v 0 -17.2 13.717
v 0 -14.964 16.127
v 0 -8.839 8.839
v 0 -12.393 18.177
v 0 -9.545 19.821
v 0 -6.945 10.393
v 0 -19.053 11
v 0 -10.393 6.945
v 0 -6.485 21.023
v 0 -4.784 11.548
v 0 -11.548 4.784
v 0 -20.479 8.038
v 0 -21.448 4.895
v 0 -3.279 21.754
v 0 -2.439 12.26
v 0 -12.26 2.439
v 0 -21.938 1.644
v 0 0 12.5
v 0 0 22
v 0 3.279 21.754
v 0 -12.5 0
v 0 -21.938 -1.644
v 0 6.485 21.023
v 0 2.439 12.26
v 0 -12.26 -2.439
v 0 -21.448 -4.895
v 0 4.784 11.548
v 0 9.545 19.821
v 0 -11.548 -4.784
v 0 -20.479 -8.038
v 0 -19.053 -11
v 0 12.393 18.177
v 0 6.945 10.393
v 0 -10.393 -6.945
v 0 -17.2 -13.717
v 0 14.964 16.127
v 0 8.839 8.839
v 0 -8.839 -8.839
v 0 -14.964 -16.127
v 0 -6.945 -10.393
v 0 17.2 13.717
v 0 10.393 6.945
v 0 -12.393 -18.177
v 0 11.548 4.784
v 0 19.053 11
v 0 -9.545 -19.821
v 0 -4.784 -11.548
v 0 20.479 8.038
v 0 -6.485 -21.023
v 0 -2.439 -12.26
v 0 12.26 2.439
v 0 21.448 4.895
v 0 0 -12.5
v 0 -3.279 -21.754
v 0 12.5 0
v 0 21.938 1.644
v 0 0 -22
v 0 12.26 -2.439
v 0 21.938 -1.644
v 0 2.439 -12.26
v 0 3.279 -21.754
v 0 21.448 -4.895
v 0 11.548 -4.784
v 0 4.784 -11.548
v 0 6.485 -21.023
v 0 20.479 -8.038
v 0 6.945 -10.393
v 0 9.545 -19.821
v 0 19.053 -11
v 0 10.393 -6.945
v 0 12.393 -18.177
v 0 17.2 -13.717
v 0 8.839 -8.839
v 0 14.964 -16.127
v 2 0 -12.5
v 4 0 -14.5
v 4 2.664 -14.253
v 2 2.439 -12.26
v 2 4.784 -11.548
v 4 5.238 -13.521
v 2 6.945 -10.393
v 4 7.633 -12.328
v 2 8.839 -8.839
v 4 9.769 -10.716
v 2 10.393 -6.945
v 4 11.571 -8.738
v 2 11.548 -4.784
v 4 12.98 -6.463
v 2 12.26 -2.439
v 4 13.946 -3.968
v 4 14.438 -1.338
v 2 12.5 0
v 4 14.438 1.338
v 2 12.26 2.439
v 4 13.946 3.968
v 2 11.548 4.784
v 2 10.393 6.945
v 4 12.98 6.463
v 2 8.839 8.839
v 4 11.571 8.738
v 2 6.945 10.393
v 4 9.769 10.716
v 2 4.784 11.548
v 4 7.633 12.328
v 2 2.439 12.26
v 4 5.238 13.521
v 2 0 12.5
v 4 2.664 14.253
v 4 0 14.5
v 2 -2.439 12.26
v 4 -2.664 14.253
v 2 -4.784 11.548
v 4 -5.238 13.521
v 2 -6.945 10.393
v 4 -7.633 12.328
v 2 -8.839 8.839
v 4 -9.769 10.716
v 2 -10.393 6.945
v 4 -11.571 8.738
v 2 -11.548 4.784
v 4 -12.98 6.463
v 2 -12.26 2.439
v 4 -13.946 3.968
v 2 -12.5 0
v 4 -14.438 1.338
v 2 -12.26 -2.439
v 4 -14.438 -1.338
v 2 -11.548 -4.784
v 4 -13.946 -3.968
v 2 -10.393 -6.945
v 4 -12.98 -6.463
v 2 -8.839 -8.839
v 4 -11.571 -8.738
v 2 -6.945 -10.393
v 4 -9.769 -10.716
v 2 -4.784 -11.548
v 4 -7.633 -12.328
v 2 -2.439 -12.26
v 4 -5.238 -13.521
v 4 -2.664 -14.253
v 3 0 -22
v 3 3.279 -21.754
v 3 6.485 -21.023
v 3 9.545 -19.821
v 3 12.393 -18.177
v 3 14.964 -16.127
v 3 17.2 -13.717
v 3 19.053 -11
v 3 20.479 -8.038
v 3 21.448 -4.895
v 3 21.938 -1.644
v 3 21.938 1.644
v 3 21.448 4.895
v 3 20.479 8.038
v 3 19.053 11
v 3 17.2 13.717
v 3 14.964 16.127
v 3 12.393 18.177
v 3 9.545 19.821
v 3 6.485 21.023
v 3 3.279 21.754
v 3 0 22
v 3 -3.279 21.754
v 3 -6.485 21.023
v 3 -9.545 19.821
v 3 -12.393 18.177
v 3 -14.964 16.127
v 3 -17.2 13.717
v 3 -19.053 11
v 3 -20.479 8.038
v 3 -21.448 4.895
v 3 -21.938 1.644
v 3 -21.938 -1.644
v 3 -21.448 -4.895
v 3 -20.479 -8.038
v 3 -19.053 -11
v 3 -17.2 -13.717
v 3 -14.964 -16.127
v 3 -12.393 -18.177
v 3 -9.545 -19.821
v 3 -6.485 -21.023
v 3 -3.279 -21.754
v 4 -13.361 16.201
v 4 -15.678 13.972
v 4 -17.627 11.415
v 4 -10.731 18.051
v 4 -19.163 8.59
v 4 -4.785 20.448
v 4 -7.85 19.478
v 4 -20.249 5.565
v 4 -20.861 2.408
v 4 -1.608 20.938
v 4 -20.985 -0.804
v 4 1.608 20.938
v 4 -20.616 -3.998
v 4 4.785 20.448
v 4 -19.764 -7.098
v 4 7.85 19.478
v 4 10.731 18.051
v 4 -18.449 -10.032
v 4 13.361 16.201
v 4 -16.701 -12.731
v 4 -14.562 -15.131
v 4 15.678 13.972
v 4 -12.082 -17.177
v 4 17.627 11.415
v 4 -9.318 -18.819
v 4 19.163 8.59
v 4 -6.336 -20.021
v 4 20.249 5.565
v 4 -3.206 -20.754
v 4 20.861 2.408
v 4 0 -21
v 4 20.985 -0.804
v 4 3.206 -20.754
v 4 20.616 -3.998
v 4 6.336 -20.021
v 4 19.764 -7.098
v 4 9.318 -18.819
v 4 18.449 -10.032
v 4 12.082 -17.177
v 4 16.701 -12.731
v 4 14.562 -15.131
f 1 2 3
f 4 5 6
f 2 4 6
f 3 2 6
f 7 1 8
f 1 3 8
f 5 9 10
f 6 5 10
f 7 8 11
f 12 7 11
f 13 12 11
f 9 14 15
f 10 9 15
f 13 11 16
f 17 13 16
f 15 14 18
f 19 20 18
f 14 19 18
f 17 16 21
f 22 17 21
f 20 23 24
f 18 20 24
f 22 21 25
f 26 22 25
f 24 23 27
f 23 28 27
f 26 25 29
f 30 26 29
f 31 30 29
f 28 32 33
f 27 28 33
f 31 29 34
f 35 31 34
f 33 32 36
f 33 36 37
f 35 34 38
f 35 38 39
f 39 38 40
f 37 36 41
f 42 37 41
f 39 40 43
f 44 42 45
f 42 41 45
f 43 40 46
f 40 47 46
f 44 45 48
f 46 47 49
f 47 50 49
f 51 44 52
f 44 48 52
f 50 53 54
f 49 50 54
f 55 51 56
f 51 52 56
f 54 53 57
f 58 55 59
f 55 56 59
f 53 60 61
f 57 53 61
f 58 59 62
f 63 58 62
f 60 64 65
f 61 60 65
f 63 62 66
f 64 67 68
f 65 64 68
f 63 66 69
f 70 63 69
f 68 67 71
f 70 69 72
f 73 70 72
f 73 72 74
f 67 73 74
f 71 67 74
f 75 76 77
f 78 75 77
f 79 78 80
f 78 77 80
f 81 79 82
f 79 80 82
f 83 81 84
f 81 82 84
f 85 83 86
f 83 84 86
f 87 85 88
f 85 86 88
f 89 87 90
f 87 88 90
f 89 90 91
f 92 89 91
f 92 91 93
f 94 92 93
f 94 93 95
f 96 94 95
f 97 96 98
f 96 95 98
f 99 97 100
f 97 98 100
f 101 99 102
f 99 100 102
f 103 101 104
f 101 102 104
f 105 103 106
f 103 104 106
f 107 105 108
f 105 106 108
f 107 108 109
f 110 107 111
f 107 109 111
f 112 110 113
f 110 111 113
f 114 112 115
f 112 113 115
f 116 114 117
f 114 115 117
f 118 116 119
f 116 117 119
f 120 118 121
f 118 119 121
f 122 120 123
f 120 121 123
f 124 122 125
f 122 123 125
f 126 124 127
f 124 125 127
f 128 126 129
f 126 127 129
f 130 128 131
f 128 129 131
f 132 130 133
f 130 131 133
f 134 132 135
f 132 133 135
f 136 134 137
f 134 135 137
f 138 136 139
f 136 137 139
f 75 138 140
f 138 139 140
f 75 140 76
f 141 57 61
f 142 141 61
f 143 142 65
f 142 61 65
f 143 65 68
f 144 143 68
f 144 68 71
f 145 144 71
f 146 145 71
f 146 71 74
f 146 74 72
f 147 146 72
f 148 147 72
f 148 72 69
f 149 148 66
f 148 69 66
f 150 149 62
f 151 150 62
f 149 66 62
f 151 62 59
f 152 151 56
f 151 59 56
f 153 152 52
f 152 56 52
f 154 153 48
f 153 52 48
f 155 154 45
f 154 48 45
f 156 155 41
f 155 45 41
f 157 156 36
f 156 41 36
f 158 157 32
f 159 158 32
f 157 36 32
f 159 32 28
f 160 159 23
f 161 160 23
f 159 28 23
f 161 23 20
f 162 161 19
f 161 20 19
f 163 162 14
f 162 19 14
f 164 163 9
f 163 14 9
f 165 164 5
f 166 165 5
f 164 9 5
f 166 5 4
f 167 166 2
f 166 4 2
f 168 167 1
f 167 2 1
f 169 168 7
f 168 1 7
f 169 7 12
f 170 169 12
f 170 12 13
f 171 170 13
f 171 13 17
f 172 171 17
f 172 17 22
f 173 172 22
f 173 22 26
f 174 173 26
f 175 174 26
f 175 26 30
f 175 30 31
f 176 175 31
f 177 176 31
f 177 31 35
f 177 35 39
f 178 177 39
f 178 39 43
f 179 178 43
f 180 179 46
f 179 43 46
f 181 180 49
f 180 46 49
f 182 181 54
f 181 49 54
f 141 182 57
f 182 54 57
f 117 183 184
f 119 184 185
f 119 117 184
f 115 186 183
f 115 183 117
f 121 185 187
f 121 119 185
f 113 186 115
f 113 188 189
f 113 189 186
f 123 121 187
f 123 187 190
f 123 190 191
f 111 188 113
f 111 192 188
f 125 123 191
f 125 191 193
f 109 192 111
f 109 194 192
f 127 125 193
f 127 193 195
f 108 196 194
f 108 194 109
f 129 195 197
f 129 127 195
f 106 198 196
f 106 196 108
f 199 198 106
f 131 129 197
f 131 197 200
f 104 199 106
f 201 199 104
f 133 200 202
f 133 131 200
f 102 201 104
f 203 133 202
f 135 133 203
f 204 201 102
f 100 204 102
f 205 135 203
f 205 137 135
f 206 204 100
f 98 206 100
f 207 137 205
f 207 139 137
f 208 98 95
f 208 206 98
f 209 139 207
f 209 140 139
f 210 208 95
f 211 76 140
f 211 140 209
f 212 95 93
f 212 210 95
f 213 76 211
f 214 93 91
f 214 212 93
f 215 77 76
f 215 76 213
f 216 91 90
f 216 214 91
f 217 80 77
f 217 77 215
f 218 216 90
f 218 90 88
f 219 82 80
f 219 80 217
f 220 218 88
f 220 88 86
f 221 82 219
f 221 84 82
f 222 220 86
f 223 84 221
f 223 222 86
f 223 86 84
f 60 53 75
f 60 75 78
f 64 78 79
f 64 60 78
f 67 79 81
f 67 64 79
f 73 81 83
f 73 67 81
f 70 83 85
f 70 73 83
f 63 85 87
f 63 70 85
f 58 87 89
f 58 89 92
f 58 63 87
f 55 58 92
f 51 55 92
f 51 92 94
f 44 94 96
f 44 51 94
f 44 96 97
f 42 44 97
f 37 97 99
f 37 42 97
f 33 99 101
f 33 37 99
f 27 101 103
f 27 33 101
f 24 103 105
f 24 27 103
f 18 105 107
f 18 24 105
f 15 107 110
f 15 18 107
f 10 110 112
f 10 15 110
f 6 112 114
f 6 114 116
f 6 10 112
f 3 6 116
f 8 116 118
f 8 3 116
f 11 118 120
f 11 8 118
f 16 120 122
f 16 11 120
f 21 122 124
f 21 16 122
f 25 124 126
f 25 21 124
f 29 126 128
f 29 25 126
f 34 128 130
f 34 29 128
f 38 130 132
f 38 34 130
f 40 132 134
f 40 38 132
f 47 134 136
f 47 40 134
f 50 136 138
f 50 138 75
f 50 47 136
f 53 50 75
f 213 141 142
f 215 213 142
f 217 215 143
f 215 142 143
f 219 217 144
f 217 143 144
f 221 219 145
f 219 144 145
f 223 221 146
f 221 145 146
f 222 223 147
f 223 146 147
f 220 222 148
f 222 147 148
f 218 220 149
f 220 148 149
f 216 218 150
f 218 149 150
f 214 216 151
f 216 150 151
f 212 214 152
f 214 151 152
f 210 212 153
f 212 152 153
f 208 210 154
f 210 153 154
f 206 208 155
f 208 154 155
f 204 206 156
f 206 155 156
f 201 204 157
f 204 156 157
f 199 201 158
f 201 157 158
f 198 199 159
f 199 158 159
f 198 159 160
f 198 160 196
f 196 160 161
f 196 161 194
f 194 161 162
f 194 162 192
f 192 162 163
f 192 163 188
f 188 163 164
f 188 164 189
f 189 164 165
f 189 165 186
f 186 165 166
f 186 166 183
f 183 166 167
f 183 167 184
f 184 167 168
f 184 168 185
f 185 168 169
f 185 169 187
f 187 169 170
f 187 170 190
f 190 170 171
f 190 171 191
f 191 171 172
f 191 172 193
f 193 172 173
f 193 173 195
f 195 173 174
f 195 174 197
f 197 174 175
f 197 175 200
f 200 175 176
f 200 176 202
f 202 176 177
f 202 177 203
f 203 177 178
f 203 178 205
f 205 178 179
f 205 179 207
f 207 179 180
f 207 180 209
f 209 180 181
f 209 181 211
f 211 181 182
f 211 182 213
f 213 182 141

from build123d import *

# Parameters (mm, degrees)
SKETCH1_R          = 22
SKETCH1_R_2        = 12.5
BASE_EXTRUDE_DEPTH = 4
IDCHAMFER_SIZE     = 2
ODCHAMFER_SIZE     = 1


with BuildPart() as part:
    # Sketch1 → Base-Extrude (new body)
    with BuildSketch(Plane(origin=(0, 0, 0), x_dir=(0, 0, -1), z_dir=(1, 0, 0))):
        Circle(SKETCH1_R)
        Circle(SKETCH1_R_2, mode=Mode.SUBTRACT)
    extrude(amount=BASE_EXTRUDE_DEPTH)

    # IDchamfer
    idchamfer_edges = [part.edges().sort_by_distance(p)[0] for p in [
        (4, 0, 12.5),
    ]]
    chamfer(idchamfer_edges, length=IDCHAMFER_SIZE)

    # ODchamfer
    odchamfer_edges = [part.edges().sort_by_distance(p)[0] for p in [
        (4, 0, 22),
    ]]
    chamfer(odchamfer_edges, length=ODCHAMFER_SIZE)


solid = part.part
